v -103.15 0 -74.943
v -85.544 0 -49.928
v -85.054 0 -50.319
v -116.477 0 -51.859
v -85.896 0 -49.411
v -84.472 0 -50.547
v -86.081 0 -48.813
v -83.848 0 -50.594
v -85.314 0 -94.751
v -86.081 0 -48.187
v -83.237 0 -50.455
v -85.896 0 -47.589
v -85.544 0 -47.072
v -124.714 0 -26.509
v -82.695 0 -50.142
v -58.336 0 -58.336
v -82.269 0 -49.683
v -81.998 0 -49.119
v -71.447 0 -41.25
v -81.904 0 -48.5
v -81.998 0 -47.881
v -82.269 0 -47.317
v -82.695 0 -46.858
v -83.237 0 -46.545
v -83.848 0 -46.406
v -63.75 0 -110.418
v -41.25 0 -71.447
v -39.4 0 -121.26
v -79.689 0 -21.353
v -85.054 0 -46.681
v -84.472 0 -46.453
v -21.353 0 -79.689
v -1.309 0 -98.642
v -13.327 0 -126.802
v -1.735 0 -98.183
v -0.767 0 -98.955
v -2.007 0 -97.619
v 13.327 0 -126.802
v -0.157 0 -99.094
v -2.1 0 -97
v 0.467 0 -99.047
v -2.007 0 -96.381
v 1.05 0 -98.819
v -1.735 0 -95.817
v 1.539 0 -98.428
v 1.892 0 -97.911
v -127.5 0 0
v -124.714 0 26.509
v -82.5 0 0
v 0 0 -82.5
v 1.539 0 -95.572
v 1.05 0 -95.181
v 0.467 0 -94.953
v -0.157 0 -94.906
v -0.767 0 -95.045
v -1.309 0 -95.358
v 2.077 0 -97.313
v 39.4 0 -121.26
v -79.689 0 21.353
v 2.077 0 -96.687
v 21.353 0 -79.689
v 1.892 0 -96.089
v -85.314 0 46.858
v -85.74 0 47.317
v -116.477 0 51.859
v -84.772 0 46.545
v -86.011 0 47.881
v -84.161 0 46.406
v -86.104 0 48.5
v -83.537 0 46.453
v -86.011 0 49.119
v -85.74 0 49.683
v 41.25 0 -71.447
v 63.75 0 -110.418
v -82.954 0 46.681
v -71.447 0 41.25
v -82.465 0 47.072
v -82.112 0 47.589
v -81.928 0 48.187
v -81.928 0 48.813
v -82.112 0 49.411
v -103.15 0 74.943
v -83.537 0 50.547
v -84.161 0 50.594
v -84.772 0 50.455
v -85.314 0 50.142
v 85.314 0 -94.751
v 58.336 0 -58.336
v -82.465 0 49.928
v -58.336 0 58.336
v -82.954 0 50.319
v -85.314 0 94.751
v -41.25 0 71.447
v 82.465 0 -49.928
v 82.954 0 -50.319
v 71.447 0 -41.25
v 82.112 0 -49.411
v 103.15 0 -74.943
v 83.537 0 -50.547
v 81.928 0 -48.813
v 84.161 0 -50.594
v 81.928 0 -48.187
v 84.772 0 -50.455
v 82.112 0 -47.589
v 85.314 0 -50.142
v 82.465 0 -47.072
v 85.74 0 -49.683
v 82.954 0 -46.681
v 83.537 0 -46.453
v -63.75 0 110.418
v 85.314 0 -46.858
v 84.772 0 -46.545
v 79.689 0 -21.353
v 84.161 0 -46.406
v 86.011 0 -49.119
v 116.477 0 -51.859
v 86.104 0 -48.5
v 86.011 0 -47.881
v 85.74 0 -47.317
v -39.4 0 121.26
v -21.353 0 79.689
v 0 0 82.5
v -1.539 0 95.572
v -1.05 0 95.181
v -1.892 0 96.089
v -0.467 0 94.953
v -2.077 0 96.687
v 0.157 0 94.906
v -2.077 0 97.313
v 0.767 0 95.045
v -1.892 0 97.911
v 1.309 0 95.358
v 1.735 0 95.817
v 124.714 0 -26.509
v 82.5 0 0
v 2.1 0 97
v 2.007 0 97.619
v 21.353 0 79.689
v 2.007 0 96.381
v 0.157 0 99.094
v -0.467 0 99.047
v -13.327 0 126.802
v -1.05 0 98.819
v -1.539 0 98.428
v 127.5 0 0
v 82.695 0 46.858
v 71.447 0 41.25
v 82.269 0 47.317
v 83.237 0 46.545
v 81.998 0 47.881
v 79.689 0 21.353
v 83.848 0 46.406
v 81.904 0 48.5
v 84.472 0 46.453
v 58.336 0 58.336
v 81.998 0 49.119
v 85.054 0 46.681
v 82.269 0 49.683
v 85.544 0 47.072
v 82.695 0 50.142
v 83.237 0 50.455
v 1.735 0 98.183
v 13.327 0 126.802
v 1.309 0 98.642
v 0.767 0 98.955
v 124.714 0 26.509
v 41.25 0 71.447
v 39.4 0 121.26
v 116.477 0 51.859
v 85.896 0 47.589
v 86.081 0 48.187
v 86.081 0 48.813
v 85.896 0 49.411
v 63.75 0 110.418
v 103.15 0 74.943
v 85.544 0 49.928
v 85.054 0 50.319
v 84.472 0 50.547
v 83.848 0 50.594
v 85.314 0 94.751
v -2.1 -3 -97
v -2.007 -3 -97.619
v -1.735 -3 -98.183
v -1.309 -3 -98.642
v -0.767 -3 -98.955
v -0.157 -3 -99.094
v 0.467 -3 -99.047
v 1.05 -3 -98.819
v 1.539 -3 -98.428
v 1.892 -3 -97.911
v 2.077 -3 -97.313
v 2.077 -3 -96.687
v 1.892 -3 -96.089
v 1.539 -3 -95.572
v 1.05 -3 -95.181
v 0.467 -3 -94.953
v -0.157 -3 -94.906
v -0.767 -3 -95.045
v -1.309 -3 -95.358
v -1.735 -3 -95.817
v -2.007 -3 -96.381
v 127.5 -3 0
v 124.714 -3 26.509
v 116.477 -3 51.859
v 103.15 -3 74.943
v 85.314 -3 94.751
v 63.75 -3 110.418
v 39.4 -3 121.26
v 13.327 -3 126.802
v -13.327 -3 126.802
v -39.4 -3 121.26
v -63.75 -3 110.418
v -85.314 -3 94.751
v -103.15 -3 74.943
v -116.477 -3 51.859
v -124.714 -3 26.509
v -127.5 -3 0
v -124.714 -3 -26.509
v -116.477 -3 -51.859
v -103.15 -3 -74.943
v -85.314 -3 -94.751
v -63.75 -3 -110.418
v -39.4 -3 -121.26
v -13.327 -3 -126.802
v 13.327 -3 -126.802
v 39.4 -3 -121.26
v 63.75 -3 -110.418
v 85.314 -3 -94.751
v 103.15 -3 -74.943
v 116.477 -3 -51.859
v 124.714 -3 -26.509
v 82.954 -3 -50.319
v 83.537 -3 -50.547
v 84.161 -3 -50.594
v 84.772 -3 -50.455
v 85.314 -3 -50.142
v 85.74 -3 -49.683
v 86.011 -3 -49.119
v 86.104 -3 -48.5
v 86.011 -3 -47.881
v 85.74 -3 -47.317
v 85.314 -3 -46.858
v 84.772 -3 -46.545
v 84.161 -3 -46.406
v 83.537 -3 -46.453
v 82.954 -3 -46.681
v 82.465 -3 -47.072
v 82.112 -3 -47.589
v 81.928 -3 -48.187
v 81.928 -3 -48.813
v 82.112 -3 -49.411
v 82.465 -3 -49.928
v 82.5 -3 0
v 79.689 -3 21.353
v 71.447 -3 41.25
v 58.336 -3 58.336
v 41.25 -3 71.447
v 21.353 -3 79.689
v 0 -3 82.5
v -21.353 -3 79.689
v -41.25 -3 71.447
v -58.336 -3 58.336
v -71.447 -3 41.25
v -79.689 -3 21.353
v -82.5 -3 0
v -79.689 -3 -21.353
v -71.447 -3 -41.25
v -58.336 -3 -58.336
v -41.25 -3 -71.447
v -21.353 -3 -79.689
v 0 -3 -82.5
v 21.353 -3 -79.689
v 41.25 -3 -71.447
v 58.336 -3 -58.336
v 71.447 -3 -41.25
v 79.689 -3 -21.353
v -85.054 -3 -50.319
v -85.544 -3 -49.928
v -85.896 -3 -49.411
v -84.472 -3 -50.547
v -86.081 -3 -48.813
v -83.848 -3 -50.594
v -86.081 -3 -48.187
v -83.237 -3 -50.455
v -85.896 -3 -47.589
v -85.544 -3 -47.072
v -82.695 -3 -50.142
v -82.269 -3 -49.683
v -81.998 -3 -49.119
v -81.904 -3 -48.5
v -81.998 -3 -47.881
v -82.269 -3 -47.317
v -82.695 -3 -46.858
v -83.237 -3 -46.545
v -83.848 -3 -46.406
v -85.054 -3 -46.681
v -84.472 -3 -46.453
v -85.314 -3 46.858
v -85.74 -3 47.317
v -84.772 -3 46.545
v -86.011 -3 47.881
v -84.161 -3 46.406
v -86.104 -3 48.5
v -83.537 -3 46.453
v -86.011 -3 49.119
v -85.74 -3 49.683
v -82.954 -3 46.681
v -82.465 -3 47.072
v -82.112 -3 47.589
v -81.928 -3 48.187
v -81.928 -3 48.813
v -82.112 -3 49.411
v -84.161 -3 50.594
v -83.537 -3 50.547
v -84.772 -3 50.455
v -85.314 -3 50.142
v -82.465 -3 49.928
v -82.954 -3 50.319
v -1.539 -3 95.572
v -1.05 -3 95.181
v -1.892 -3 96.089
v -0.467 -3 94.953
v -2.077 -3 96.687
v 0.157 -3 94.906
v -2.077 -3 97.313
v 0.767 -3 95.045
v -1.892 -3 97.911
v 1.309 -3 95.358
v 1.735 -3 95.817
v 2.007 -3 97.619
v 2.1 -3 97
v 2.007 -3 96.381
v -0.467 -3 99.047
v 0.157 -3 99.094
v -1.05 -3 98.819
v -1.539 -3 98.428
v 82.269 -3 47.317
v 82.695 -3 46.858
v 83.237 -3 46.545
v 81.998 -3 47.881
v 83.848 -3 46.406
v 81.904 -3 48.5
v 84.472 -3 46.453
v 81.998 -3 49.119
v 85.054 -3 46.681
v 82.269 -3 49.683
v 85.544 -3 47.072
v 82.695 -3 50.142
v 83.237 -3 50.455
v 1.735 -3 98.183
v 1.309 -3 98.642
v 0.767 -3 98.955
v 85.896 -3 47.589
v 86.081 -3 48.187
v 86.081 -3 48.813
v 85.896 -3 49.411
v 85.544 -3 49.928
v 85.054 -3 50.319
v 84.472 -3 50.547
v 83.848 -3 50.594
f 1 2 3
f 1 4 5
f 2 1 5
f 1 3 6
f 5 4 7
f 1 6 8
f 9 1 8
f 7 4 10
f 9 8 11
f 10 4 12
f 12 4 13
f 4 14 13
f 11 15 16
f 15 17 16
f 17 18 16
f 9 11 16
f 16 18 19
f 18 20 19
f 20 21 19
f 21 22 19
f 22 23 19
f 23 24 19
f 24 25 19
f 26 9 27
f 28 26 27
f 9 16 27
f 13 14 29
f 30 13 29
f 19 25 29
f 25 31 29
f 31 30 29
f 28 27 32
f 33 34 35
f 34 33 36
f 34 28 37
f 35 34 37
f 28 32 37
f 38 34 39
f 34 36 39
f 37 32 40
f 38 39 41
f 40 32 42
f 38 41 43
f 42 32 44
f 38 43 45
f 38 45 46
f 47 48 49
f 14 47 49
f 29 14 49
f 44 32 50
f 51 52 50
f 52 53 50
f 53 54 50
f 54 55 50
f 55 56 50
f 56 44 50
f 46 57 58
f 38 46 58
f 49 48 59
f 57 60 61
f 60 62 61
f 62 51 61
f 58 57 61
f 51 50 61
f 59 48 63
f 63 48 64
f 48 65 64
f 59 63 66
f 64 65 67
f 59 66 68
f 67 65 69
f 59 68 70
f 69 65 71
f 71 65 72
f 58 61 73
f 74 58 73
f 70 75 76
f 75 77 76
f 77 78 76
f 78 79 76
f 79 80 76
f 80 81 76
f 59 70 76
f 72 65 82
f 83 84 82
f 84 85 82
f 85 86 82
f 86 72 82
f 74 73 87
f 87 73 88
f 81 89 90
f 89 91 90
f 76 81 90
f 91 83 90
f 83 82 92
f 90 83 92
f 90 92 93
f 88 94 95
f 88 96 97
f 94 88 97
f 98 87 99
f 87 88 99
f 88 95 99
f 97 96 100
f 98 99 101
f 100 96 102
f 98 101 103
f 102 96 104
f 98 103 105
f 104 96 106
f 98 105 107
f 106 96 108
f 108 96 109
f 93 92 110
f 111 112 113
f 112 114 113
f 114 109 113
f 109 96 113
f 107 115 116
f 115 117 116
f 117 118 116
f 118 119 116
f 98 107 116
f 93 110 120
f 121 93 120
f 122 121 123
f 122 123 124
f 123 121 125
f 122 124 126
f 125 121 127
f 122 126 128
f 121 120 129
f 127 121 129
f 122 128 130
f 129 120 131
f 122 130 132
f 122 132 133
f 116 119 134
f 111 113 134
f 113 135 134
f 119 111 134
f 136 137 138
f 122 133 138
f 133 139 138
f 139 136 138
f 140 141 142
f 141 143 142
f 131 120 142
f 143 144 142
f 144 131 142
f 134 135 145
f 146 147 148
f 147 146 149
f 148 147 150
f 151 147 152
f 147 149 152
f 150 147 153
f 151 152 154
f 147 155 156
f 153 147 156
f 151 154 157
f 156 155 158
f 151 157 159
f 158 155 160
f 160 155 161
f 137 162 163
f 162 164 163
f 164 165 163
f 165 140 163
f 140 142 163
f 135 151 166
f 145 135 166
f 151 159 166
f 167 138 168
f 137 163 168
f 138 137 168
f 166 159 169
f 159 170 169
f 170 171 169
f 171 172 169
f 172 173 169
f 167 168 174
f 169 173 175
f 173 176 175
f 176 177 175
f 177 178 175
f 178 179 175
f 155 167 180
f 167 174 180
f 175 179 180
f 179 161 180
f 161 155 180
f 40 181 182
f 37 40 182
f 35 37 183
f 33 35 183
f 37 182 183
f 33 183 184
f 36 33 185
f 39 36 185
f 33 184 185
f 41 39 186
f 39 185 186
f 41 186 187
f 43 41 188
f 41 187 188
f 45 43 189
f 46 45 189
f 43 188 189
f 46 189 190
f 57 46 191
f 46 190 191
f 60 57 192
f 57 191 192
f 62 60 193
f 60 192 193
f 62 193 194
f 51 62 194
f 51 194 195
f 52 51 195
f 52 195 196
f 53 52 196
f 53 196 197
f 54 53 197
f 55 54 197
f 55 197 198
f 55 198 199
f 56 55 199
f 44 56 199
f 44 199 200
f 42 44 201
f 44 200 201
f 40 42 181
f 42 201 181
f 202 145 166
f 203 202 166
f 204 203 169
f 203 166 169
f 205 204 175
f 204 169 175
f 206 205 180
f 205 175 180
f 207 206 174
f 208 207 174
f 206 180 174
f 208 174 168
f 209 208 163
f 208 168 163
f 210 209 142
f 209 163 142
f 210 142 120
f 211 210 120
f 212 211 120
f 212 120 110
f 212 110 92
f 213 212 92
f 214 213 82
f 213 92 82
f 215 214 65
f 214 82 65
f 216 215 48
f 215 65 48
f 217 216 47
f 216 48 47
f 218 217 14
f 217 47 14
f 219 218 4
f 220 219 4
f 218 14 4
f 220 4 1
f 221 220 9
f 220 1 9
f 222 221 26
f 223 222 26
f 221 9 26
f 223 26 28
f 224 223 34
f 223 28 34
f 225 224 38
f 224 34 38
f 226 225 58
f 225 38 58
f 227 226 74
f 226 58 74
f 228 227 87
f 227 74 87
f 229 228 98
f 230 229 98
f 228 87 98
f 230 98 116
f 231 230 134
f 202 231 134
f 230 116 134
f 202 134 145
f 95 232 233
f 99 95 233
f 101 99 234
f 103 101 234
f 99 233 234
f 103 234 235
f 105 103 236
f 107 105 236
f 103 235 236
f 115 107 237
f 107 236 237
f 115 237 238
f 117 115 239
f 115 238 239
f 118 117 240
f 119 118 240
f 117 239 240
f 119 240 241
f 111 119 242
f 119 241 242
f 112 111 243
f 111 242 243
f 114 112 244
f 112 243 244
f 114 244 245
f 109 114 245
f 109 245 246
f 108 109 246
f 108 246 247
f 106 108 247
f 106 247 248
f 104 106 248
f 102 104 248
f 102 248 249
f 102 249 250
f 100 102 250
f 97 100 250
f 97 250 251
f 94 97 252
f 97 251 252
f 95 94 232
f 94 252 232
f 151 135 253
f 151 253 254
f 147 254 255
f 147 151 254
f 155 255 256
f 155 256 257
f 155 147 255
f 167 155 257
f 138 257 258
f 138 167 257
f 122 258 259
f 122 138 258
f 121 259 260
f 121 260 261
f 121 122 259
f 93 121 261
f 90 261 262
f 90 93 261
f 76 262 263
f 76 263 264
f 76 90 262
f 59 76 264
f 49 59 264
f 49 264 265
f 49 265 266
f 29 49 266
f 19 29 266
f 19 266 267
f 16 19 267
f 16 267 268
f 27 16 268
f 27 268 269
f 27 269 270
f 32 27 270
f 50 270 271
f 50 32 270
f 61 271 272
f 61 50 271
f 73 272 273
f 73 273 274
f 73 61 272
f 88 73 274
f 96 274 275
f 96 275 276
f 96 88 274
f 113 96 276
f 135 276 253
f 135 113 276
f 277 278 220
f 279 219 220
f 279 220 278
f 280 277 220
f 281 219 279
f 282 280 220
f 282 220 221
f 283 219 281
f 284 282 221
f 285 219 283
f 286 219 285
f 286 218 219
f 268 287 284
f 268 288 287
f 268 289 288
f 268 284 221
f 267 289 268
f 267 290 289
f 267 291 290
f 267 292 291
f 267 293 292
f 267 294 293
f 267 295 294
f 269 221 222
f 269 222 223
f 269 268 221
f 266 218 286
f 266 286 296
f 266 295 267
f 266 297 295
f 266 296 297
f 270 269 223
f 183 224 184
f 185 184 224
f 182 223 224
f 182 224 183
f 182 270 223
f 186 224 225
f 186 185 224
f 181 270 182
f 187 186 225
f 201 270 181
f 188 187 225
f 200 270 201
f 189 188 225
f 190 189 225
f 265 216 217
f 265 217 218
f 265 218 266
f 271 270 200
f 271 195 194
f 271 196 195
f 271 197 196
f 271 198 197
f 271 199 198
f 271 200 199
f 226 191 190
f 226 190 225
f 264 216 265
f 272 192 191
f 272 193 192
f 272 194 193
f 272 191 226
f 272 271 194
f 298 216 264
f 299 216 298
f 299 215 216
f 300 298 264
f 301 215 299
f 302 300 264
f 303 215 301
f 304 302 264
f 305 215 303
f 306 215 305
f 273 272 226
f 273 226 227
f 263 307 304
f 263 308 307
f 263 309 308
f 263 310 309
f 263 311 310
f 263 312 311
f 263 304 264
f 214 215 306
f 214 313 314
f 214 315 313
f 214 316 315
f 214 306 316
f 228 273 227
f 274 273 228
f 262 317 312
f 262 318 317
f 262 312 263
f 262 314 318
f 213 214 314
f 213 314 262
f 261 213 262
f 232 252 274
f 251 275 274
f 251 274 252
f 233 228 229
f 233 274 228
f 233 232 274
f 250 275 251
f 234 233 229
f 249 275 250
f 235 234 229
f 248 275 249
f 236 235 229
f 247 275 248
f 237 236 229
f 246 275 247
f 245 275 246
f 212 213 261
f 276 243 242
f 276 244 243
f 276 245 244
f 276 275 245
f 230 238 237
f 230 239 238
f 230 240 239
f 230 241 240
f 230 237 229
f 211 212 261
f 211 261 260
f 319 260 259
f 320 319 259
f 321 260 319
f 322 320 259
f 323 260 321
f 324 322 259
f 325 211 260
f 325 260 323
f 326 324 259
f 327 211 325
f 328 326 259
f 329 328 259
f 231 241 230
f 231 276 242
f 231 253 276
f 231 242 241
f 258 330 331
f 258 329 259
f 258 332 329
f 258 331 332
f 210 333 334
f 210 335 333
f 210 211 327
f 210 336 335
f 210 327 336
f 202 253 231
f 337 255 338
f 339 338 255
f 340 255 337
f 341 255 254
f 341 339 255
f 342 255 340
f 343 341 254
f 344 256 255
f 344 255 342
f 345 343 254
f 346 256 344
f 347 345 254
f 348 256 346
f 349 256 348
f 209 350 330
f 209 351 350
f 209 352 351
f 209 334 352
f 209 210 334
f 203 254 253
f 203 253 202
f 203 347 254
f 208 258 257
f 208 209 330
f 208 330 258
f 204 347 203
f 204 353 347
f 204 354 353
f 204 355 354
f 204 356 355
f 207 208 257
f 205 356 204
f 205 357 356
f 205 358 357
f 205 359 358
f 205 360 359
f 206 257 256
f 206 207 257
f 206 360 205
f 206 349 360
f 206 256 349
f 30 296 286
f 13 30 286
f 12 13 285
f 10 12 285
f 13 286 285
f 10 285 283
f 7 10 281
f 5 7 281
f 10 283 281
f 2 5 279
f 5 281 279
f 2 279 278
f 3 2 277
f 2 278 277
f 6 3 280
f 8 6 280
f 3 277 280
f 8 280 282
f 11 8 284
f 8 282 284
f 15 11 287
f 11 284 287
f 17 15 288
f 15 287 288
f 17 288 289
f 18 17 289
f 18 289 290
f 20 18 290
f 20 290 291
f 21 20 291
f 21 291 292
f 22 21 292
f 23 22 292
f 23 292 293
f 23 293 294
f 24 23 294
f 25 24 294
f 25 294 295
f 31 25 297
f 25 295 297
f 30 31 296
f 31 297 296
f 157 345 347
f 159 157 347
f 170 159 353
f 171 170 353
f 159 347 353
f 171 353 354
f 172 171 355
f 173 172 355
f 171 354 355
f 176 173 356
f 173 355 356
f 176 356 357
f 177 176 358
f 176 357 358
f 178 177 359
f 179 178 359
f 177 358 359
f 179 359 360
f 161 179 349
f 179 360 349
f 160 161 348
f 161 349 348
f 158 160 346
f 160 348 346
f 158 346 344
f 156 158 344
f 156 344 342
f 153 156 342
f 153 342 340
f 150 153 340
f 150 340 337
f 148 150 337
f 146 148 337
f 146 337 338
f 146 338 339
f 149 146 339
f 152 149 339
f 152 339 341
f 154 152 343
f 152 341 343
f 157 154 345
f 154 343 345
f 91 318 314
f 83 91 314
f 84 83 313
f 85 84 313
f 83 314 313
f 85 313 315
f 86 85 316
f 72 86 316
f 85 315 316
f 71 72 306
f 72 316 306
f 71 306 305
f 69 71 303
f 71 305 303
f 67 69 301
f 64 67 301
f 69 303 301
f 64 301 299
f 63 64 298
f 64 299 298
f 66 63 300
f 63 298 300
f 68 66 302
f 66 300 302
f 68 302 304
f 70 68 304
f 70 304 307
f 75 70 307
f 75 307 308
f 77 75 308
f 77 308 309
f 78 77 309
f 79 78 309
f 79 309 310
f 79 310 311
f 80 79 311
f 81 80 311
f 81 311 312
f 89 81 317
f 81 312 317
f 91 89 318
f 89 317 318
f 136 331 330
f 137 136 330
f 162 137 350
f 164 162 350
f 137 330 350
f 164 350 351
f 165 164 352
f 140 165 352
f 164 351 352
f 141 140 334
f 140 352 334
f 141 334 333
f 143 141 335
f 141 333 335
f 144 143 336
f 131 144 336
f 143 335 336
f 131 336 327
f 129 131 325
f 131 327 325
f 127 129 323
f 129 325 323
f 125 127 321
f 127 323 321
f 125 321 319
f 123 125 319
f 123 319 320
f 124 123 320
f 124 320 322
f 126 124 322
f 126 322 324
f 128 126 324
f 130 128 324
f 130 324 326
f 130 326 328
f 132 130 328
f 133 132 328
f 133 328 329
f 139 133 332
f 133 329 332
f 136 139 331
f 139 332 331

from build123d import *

# Parameters (mm, degrees)
F0_R            = 127.5
F0_R_2          = 82.5
F1_DEPTH        = 3
F2_R            = 2.1
F3_DEPTH        = 3
F3_COPIES_COUNT = 6


# Not quite as in the source:
# - a pattern or mirror of a feature is missing from the dataset's text; its kind, count and spacing are read off the source's solid


with BuildPart() as f1:
    # F0 (on Front) → F1 (new body)
    with BuildSketch(Plane.XZ):
        Circle(F0_R)
        Circle(F0_R_2, mode=Mode.SUBTRACT)
    extrude(amount=F1_DEPTH)

    # F2 (on face) → F3 (cut, through all)
    with BuildSketch(Plane.XZ.offset(3)):
        with Locations((0, 97)):
            Circle(F2_R)
    f3 = extrude(amount=-F3_DEPTH, mode=Mode.SUBTRACT)

    # F3_copies: F3 ×6 about axis
    f3_copies_axis = Axis((0, 0, 0), (0, 1, 0))
    for i in range(1, F3_COPIES_COUNT):
        add(f3.rotate(f3_copies_axis, i * 360 / F3_COPIES_COUNT), mode=Mode.SUBTRACT)


solid = f1.part
